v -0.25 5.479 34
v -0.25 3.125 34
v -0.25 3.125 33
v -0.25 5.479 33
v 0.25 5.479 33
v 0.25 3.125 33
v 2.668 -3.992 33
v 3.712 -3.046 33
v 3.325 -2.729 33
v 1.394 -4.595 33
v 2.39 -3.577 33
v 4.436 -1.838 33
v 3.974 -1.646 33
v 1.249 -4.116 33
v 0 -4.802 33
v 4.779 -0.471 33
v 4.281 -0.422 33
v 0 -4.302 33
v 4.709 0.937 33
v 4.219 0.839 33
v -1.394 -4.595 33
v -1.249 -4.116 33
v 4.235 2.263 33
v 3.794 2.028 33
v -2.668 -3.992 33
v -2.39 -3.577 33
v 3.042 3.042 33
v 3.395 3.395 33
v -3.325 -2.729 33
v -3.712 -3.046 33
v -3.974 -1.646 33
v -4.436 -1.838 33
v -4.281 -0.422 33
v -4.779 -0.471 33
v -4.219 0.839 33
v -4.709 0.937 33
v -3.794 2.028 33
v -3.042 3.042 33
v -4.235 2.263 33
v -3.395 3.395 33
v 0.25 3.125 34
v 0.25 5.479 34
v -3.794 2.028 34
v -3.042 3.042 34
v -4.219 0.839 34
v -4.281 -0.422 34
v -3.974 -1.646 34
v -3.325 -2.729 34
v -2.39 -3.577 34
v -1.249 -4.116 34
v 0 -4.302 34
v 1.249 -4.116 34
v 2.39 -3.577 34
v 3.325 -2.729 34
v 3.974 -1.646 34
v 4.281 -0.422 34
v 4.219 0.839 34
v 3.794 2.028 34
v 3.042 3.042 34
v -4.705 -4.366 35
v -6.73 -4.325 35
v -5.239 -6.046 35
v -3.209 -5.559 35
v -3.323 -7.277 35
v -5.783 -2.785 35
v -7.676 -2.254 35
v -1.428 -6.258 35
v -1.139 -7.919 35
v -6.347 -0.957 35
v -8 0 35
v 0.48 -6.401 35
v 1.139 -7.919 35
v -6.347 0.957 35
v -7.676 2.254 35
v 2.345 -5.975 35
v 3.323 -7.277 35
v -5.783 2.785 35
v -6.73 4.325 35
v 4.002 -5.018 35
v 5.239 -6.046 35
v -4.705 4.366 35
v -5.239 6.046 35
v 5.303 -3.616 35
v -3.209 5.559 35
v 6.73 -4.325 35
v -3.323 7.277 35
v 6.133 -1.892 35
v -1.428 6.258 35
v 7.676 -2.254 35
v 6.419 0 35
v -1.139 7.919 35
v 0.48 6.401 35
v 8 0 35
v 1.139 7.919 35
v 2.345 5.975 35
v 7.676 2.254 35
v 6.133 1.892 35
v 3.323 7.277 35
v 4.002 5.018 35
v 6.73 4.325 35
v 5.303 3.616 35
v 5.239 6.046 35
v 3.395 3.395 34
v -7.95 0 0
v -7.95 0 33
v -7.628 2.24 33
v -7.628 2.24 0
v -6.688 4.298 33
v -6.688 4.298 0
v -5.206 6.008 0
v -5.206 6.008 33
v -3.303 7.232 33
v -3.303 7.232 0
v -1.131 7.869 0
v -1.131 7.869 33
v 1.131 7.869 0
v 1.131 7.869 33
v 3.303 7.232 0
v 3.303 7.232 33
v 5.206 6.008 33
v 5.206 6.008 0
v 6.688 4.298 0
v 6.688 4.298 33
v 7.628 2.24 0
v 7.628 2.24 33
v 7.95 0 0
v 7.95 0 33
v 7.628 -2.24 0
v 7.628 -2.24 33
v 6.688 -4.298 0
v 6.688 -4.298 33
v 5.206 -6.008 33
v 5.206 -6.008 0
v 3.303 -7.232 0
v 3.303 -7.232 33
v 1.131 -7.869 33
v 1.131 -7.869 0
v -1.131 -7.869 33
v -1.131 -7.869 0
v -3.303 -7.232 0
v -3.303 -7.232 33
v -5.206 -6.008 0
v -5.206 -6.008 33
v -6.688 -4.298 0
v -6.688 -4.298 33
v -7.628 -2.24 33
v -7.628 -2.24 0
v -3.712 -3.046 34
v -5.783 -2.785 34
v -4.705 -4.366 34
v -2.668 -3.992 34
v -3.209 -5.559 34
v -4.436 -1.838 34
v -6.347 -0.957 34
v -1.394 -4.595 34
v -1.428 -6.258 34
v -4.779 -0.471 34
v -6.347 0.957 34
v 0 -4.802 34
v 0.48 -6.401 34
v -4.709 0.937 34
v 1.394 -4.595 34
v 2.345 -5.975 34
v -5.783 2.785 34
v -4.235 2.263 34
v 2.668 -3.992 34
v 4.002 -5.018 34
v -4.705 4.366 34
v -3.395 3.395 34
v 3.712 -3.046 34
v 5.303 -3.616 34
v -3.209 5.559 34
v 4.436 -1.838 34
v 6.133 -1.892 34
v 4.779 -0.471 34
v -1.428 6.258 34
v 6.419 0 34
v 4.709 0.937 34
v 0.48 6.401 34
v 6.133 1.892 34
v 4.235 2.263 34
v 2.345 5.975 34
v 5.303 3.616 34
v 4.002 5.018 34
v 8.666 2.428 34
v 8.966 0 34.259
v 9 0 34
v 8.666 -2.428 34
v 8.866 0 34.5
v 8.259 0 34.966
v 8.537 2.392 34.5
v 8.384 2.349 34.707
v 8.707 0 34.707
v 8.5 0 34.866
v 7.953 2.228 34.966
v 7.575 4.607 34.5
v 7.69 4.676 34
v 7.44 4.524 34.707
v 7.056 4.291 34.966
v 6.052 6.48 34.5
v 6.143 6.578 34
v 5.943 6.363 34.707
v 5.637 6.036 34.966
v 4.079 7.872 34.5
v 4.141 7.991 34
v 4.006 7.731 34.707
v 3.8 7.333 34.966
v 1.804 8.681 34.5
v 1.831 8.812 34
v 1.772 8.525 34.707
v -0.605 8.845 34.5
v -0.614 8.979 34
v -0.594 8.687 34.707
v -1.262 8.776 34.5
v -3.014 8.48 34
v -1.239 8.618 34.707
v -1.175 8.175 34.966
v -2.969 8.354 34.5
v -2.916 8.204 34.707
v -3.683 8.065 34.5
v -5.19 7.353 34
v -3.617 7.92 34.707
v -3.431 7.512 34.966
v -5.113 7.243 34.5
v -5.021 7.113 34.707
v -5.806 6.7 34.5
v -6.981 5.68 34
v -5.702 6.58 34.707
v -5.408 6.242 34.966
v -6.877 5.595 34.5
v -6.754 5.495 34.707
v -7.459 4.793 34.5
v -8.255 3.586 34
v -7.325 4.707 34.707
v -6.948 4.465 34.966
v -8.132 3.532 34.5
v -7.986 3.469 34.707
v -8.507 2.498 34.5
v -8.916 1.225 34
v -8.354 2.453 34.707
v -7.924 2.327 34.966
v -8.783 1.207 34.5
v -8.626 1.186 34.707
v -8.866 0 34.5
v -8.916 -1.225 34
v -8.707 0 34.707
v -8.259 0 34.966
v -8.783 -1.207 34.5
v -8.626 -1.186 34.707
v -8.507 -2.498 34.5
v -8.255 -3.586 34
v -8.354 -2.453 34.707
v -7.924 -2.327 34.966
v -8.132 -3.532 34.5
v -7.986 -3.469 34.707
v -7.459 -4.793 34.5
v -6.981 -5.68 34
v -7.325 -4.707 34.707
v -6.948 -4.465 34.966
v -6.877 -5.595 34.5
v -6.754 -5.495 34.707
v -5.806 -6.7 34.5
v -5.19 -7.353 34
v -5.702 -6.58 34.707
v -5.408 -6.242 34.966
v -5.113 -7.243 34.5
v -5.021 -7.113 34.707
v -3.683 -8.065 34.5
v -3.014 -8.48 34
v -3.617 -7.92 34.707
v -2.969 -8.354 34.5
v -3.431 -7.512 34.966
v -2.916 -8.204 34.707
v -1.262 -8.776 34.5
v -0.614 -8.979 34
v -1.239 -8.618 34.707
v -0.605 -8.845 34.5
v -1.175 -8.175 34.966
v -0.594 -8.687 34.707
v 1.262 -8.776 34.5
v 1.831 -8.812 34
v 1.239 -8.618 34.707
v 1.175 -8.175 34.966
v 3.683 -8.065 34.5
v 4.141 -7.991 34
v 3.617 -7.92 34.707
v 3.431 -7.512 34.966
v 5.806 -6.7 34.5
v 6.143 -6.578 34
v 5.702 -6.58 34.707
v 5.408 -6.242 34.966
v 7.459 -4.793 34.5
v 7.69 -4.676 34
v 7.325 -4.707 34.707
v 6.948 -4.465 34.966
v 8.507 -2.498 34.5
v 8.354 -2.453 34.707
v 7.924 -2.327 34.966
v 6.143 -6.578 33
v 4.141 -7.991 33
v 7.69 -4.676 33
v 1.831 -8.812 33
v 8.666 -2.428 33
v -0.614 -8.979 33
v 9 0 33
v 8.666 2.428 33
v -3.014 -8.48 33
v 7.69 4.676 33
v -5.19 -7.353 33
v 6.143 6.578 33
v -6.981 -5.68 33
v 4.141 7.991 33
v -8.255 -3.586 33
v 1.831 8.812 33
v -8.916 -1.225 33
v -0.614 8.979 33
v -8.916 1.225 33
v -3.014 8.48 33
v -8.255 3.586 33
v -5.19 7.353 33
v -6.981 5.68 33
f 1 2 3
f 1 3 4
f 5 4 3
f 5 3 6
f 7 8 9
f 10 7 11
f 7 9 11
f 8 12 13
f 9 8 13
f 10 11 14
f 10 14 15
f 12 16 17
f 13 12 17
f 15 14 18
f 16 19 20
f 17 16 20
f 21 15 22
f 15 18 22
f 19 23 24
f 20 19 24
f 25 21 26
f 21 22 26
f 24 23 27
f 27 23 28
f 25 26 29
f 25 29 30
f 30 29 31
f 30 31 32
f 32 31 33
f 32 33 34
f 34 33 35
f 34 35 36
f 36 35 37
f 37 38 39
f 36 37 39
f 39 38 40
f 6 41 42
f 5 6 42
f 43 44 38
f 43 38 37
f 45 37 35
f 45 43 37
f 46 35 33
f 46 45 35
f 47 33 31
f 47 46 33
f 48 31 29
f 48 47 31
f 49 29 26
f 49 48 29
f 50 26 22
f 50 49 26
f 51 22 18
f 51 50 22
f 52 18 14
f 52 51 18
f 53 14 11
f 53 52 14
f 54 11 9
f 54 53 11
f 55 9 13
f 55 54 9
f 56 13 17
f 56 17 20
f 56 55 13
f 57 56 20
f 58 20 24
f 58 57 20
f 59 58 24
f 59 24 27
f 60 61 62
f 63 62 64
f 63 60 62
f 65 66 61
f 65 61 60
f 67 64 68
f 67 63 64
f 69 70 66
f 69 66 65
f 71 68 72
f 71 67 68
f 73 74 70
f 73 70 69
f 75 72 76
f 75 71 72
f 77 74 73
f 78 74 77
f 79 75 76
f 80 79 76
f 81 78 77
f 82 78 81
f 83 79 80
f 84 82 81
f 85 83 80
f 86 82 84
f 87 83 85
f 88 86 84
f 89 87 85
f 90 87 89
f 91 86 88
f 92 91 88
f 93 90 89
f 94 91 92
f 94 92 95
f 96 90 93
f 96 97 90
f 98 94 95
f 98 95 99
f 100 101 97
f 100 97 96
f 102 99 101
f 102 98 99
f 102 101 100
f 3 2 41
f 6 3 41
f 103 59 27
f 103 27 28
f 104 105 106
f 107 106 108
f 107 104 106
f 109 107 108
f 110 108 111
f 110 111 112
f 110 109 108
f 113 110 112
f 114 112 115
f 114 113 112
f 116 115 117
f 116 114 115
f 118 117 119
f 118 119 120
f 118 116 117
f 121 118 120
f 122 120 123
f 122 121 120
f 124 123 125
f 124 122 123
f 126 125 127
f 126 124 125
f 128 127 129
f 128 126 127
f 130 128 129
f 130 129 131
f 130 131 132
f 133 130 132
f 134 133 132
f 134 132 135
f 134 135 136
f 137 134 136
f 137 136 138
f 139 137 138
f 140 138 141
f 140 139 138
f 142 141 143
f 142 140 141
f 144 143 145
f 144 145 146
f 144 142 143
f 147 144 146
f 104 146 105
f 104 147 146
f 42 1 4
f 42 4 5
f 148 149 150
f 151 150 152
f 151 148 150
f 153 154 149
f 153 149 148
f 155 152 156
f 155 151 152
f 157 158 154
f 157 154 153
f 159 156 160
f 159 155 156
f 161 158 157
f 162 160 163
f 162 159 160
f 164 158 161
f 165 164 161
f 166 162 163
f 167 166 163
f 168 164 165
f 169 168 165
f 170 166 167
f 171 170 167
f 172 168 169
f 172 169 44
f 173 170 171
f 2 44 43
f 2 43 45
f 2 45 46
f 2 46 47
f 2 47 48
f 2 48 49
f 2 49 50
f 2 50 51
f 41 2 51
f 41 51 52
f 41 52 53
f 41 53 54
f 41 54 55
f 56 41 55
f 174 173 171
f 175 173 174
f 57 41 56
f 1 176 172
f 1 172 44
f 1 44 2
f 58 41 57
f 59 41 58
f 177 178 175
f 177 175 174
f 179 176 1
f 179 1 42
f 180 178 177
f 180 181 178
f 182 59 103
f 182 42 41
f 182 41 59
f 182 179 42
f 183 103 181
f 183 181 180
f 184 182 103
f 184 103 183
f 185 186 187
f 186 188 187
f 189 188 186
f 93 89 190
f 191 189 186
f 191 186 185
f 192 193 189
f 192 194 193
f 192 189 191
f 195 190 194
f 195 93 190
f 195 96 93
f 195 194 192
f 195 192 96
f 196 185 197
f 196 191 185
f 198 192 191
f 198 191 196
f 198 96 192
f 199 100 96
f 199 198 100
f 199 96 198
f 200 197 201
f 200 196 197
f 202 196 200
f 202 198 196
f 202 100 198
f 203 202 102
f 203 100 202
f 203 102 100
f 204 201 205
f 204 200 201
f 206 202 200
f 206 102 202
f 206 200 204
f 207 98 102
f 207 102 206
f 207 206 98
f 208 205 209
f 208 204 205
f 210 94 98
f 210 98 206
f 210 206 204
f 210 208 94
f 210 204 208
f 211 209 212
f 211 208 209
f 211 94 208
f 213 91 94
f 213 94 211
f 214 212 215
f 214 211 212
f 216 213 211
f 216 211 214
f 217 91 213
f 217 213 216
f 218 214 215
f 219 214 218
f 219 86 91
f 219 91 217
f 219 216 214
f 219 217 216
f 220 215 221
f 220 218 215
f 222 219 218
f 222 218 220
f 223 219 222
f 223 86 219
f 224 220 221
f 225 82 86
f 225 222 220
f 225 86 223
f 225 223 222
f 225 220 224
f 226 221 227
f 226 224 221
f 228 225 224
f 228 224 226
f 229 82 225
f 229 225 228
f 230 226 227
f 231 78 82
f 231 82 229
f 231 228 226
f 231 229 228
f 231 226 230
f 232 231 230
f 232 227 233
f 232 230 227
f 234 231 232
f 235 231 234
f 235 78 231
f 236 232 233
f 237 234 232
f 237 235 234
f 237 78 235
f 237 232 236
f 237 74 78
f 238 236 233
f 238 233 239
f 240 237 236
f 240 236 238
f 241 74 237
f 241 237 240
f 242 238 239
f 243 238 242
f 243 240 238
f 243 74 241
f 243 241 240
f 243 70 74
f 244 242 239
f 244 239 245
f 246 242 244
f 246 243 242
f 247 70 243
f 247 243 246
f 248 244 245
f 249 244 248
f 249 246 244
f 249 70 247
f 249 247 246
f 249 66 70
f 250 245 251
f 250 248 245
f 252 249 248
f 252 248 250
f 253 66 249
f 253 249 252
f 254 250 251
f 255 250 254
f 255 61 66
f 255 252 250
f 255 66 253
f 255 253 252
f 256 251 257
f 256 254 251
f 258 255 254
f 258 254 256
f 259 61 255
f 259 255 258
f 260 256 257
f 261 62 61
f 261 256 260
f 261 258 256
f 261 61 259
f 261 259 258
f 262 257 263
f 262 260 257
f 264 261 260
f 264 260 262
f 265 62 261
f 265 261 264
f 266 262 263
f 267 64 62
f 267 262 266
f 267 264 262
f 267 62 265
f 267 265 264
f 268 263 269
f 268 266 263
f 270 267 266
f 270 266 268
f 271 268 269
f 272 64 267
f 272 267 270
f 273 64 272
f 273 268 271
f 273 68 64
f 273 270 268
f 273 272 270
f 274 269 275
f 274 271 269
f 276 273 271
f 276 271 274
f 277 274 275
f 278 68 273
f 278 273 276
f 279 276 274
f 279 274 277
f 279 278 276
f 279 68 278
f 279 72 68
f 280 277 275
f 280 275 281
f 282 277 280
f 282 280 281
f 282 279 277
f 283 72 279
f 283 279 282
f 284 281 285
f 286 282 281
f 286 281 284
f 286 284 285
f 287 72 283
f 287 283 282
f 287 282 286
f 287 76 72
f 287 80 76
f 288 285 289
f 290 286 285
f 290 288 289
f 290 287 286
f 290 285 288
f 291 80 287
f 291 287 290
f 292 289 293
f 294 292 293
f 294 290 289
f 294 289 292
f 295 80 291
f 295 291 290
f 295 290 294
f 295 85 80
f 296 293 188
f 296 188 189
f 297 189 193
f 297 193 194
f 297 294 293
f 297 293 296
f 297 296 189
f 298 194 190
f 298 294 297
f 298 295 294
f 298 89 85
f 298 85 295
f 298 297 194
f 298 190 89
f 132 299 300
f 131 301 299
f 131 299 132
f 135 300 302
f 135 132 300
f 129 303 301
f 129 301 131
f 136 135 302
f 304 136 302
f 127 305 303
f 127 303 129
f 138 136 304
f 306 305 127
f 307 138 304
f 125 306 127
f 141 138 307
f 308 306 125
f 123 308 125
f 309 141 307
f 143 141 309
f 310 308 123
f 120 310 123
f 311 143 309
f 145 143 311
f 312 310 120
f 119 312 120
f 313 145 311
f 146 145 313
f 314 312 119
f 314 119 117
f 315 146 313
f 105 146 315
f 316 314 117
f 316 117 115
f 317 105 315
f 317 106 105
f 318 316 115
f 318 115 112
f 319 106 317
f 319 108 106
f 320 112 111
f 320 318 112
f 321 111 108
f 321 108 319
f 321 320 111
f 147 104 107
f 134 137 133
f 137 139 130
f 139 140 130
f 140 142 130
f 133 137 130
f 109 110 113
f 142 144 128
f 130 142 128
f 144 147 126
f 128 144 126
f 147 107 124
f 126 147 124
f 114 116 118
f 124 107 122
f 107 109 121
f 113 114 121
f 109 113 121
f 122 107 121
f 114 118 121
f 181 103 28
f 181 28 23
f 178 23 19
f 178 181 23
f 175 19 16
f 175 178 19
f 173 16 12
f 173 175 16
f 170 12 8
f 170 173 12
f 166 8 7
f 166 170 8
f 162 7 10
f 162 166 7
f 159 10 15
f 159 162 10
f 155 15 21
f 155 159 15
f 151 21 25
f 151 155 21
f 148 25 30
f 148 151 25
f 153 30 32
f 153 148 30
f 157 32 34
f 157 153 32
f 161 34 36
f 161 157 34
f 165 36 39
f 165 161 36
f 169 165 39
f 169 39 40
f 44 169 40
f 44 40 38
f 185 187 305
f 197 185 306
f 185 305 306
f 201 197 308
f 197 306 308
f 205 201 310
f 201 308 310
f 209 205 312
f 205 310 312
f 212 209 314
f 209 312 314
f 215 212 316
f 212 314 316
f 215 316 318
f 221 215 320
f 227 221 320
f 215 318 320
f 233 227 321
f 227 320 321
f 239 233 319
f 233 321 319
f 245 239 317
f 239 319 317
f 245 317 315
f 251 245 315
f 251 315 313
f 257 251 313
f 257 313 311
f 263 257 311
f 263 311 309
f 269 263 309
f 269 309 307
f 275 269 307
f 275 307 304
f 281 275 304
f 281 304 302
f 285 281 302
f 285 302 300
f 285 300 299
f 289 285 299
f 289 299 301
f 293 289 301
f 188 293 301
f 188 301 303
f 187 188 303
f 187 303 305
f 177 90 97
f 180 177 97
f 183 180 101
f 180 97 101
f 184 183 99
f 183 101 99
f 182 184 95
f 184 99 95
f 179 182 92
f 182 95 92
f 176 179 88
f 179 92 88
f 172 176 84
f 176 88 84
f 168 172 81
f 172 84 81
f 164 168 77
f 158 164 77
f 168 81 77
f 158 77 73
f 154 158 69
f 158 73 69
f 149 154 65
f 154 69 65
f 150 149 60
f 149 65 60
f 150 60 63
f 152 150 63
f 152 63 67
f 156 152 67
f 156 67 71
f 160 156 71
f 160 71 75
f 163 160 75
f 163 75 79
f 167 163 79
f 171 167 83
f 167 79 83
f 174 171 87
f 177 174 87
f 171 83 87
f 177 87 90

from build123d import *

# Parameters (mm, degrees)
SKETCH1_R           = 9
BOSS_EXTRUDE1_DEPTH = 35
SKETCH2_R           = 10.726971326
SKETCH2_R_2         = 7.95
CUT_EXTRUDE1_DEPTH  = 33
FILLET1_R           = 1
SKETCH3_R           = 6.418564364
CUT_EXTRUDE2_DEPTH  = 1
SKETCH4_W           = 0.5
SKETCH4_H           = 2.354367894
CUT_EXTRUDE3_DEPTH  = 1


with BuildPart() as part:
    # Sketch1 → Boss-Extrude1 (new body)
    with BuildSketch(Plane.XY):
        Circle(SKETCH1_R)
    extrude(amount=BOSS_EXTRUDE1_DEPTH)

    # Sketch2 → Cut-Extrude1 (cut)
    with BuildSketch(Plane(origin=(0, 0, 0), x_dir=(-1, 0, 0), z_dir=(0, 0, -1))):
        Circle(SKETCH2_R)
        Circle(SKETCH2_R_2, mode=Mode.SUBTRACT)
    extrude(amount=-CUT_EXTRUDE1_DEPTH, mode=Mode.SUBTRACT)

    # Fillet1
    fillet1_edges = [part.edges().sort_by_distance(p)[0] for p in [
        (-9, 0, 35),
    ]]
    fillet(fillet1_edges, radius=FILLET1_R)

    # Sketch3 → Cut-Extrude2 (cut)
    with BuildSketch(Plane.XY.offset(35)):
        Circle(SKETCH3_R)
    extrude(amount=-CUT_EXTRUDE2_DEPTH, mode=Mode.SUBTRACT)

    # Sketch4 → Cut-Extrude3 (cut)
    with BuildSketch(Plane.XY.offset(34)):
        with BuildLine():
            Line((-3.395267389, 3.395267389), (-3.041713998, 3.041713998))
            ThreePointArc((-3.041713998, 3.041713998), (0, -4.301633189), (3.041713998, 3.041713998))
            Line((3.041713998, 3.041713998), (3.395267389, 3.395267389))
            ThreePointArc((3.395267389, 3.395267389), (0, -4.801633189), (-3.395267389, 3.395267389))
        make_face()
        with Locations((0, 4.302029464)):
            Rectangle(SKETCH4_W, SKETCH4_H)
    extrude(amount=-CUT_EXTRUDE3_DEPTH, mode=Mode.SUBTRACT)


solid = part.part
